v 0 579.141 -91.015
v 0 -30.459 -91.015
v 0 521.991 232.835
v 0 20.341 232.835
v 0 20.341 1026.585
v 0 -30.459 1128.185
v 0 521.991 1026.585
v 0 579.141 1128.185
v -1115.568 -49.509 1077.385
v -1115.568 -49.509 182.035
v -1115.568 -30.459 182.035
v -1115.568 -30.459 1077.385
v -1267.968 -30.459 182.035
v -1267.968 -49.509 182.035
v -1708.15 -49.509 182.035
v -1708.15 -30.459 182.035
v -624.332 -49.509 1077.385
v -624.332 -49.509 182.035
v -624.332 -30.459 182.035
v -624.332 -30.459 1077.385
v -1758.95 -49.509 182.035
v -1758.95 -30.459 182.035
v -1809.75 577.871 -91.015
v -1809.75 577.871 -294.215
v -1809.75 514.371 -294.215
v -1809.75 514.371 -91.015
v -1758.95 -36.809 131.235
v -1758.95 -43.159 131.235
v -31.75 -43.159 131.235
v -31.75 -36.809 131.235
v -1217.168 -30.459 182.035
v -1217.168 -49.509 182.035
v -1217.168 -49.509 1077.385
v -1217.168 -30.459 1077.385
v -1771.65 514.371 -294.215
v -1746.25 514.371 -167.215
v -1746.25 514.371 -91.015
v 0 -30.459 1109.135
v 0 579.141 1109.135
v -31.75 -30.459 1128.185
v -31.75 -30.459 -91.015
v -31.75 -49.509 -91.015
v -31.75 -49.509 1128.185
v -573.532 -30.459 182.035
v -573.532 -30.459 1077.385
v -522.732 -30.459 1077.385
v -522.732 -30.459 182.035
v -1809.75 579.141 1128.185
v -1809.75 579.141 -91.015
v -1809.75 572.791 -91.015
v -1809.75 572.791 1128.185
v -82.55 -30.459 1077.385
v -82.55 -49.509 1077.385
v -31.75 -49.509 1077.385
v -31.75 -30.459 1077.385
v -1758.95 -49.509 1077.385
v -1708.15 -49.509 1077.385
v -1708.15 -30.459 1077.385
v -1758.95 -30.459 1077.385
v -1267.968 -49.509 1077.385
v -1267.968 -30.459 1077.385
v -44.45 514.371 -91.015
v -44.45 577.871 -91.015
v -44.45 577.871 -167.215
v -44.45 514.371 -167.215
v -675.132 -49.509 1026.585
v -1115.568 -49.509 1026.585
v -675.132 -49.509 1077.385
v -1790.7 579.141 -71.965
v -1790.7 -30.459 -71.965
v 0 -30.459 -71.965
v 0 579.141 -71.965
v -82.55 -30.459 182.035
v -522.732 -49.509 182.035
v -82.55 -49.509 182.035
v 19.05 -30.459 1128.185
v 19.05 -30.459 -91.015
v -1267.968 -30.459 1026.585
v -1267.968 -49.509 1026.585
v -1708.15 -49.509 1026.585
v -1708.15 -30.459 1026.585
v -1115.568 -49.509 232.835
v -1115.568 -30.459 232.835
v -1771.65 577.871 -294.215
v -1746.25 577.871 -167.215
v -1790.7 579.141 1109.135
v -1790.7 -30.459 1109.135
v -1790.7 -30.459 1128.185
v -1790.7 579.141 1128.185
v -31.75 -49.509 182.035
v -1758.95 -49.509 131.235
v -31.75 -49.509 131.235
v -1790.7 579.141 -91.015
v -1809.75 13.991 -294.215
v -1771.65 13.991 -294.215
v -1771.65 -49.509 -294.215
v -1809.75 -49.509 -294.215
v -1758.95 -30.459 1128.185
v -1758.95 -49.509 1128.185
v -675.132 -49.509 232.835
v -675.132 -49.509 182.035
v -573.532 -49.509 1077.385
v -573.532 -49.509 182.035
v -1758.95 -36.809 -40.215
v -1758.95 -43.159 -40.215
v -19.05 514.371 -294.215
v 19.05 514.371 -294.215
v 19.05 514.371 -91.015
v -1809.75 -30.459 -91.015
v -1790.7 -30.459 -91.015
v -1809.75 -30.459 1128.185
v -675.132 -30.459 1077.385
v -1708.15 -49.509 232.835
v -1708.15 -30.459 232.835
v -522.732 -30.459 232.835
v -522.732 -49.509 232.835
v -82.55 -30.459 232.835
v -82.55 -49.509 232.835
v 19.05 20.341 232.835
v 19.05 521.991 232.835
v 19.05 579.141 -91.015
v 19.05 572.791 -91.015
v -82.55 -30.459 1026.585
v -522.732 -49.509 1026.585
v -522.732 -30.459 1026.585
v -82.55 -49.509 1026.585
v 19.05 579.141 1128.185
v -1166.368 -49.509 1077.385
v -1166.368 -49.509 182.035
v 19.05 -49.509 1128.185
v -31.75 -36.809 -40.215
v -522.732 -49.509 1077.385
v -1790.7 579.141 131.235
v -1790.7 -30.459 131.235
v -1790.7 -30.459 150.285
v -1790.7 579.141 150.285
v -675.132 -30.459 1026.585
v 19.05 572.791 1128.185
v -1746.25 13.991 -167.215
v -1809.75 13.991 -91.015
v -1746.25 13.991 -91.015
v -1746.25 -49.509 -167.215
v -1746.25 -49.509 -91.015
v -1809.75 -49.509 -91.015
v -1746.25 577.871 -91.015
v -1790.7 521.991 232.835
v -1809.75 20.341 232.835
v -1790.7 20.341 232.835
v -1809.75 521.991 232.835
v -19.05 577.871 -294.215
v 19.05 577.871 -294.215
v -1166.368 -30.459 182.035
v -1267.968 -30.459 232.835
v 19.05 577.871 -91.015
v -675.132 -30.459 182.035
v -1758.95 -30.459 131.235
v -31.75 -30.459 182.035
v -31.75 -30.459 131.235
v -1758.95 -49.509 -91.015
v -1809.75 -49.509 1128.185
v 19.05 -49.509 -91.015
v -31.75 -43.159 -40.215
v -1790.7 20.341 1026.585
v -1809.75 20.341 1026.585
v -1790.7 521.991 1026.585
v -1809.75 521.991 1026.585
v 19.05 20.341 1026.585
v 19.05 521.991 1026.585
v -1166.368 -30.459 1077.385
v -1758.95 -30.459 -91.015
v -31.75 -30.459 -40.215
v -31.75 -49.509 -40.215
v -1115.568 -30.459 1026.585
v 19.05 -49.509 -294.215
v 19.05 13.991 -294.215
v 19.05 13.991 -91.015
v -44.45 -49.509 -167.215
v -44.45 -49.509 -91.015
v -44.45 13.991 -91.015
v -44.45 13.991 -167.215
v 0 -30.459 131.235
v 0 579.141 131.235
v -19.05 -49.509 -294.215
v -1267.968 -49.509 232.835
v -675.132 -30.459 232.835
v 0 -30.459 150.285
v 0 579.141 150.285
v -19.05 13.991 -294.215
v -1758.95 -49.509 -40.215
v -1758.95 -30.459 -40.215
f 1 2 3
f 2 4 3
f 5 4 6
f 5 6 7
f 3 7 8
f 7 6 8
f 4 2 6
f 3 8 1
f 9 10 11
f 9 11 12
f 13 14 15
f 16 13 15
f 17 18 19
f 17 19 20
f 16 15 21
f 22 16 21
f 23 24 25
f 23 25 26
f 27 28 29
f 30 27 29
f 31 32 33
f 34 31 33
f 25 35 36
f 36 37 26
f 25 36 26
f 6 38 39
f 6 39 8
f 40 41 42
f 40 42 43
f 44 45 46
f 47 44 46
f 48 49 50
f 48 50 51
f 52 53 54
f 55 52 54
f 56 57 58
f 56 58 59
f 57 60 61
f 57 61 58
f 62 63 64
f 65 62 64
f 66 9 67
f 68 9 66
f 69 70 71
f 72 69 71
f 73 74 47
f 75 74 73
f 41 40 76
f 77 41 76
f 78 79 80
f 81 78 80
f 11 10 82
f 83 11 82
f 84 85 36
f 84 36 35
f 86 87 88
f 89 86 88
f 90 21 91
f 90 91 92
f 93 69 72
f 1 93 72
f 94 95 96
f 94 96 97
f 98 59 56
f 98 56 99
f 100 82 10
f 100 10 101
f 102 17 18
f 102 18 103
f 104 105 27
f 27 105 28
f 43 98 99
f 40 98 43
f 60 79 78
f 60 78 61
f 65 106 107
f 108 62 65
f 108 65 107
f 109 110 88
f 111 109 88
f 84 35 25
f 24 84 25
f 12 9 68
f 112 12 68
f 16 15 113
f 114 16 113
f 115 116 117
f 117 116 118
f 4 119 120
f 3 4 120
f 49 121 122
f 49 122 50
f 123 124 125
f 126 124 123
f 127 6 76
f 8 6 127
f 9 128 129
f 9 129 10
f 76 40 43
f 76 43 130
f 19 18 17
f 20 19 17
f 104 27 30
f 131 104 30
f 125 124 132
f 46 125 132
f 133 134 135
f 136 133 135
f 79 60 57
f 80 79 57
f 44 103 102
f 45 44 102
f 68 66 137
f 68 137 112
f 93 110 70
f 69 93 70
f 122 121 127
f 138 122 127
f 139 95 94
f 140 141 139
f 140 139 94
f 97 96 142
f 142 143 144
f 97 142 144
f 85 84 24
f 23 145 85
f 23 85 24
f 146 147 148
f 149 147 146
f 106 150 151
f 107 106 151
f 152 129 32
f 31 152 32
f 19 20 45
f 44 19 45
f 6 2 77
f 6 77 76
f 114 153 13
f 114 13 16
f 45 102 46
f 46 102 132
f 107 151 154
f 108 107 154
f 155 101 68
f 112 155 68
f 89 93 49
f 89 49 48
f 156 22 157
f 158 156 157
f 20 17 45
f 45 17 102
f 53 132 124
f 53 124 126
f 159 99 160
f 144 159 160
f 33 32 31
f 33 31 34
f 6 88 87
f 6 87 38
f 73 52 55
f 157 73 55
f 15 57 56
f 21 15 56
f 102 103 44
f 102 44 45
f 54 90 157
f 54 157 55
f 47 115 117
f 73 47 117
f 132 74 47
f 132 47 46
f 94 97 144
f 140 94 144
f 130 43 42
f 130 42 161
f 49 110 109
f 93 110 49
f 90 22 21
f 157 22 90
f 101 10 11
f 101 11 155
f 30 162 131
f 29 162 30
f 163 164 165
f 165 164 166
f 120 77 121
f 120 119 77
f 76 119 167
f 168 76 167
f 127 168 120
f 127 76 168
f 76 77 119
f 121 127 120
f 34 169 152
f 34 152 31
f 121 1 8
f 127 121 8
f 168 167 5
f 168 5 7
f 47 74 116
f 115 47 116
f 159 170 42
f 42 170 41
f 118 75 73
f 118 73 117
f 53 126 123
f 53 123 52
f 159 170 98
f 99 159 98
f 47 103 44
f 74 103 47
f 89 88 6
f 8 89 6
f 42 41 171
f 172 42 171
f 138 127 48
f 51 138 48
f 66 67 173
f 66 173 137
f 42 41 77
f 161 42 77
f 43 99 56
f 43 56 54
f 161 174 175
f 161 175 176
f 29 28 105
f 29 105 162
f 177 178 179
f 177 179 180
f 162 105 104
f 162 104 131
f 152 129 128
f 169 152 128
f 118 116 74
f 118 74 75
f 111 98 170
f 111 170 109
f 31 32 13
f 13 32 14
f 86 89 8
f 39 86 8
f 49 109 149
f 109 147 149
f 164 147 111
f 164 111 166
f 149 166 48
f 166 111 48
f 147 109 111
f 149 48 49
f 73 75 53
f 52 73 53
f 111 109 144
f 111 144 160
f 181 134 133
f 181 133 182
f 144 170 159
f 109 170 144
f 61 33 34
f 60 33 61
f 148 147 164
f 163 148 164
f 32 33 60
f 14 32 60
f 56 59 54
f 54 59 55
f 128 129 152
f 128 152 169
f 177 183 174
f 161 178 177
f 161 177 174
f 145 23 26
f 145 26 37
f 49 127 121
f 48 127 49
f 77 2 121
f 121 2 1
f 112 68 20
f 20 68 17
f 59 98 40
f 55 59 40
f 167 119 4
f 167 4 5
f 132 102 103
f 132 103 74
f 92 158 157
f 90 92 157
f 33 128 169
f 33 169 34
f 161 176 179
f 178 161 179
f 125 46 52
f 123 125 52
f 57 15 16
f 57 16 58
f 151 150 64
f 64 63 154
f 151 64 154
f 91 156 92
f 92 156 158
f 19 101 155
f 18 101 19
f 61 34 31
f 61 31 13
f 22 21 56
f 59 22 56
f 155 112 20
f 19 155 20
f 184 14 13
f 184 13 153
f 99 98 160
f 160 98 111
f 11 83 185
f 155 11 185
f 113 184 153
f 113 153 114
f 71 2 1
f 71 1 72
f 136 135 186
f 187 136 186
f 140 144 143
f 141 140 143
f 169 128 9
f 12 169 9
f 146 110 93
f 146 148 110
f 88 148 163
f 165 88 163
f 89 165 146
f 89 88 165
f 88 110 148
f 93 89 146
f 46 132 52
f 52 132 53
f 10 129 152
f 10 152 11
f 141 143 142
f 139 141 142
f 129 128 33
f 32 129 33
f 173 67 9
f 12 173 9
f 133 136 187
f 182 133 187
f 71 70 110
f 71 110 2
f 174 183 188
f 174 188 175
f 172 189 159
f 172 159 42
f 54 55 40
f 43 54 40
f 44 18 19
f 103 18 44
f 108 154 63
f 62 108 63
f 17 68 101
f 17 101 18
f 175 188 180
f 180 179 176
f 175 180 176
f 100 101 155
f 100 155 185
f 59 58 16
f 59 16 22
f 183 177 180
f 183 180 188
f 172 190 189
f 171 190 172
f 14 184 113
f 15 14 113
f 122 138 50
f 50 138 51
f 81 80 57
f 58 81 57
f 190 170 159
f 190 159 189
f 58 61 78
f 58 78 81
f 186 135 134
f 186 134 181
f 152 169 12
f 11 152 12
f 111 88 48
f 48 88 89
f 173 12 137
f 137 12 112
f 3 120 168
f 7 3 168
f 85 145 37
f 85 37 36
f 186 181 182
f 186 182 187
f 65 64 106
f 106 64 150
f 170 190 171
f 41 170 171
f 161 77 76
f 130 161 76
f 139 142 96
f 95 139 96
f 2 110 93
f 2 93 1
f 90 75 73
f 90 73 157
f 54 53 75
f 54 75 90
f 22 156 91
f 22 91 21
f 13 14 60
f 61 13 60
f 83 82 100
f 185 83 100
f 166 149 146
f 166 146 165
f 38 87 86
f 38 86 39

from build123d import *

# Parameters (mm, degrees)
F0_W      = 609.6
F0_H      = 1219.2
F1_DEPTH  = 19.05
F2_W      = 501.65
F2_H      = 793.75
F3_DEPTH  = 19.051
F6_W      = 1790.7
F6_H      = 19.05
F7_DEPTH  = 609.6
F8_W      = 1790.7
F8_H      = 19.05
F9_DEPTH  = 609.6
F10_W     = 1790.7
F10_H     = 19.05
F11_DEPTH = 609.6
F12_W     = 50.8
F12_H     = 1219.2
F13_DEPTH = 19.05
F15_W     = 1727.2
F15_H     = 50.8
F16_DEPTH = 19.05
F17_W     = 1727.2
F17_H     = 50.8
F18_DEPTH = 19.05
F19_W     = 1727.2
F19_H     = 50.8
F20_DEPTH = 19.05
F23_W     = 50.8
F23_H     = 895.35
F24_DEPTH = 19.05
F22_W     = 1727.2
F22_H     = 171.45
F26_DEPTH = 6.35
F27_W     = 50.8
F27_H     = 895.35
F28_DEPTH = 19.05
F29_W     = 50.8
F29_H     = 895.35
F30_DEPTH = 19.05
F31_W     = 440.182
F31_H     = 50.8
F32_DEPTH = 19.05
F33_W     = 440.182
F33_H     = 50.8
F34_DEPTH = 19.05
F36_W     = 50.8
F36_H     = 895.35
F37_DEPTH = 19.05
F38_W     = 50.8
F38_H     = 895.35
F39_DEPTH = 19.05
F40_W     = 440.436
F40_H     = 50.8
F41_DEPTH = 19.05
F42_W     = 440.436
F42_H     = 50.8
F43_DEPTH = 19.05
F44_W     = 1828.8
F44_H     = 1219.2
F45_DEPTH = 6.35
F47_DEPTH = 63.5


with BuildPart() as f1:
    # F0 (on Right) → F1 (new body)
    with BuildSketch(Plane.YZ):
        with Locations((274.3411302805, 518.5848358816)):
            Rectangle(F0_W, F0_H)
    extrude(amount=F1_DEPTH)

    # F2 (on face) → F3 (cut, through all)
    with BuildSketch(Plane.YZ.offset(19.05)):
        with Locations((271.1661302805, 629.7098358816)):
            Rectangle(F2_W, F2_H)
    extrude(amount=-F3_DEPTH, mode=Mode.SUBTRACT)


with BuildPart() as f5_1:
    # F5: instance of F1
    add(f1.part.mirror(Plane(origin=(-895.35, 278.0051626517, 390.3437028911), x_dir=(0, 1, 0), z_dir=(1, 0, 0))))


with BuildPart() as f7:
    # F6 (on face) → F7 (new body)
    with BuildSketch(Plane.XZ.offset(30.4588697195)):
        with Locations((-895.35, 1118.6598358816)):
            Rectangle(F6_W, F6_H)
    extrude(amount=-F7_DEPTH)


with BuildPart() as f9:
    # F8 (on face) → F9 (new body)
    with BuildSketch(Plane.XZ.offset(30.4588697195)):
        with Locations((-895.35, -81.4901641184)):
            Rectangle(F8_W, F8_H)
    extrude(amount=-F9_DEPTH)


with BuildPart() as f11:
    # F10 (on face) → F11 (new body)
    with BuildSketch(Plane.XZ.offset(30.4588697195)):
        with Locations((-895.35, 140.7598358816)):
            Rectangle(F10_W, F10_H)
    extrude(amount=-F11_DEPTH)


with BuildPart() as f13:
    # F12 (on face) → F13 (new body)
    with BuildSketch(Plane.XZ.offset(30.4588697195)):
        with Locations((-6.35, 518.5848358816)):
            Rectangle(F12_W, F12_H)
    extrude(amount=F13_DEPTH)


with BuildPart() as f14_1:
    # F14: instance of F13
    add(f13.part.mirror(Plane(origin=(-895.35, 278.0051626517, 390.3437028911), x_dir=(0, 1, 0), z_dir=(1, 0, 0))))


with BuildPart() as f16:
    # F15 (on face) → F16 (new body)
    with BuildSketch(Plane.XZ.offset(30.4588697195)):
        with Locations((-895.35, 1102.7848358816)):
            Rectangle(F15_W, F15_H)
    extrude(amount=F16_DEPTH)


with BuildPart() as f18:
    # F17 (on face) → F18 (new body)
    with BuildSketch(Plane.XZ.offset(30.4588697195)):
        with Locations((-895.35, 156.6348358816)):
            Rectangle(F17_W, F17_H)
    extrude(amount=F18_DEPTH)


with BuildPart() as f20:
    # F19 (on face) → F20 (new body)
    with BuildSketch(Plane.XZ.offset(30.4588697195)):
        with Locations((-895.35, -65.6151641184)):
            Rectangle(F19_W, F19_H)
    extrude(amount=F20_DEPTH)


with BuildPart() as f24:
    # F23 (on face) → F24 (new body)
    with BuildSketch(Plane.XZ.offset(49.5088697195)):
        with Locations((-598.932, 629.7098358816)):
            Rectangle(F23_W, F23_H)
    extrude(amount=-F24_DEPTH)


with BuildPart() as f25_1:
    # F25: instance of F24
    add(f24.part.mirror(Plane(origin=(-895.35, 278.0051626517, 390.3437028911), x_dir=(0, 1, 0), z_dir=(1, 0, 0))))


with BuildPart() as f26:
    # F22 (on offset) → F26 (new body)
    with BuildSketch(Plane.XZ.offset(43.1588697195)):
        with Locations((-895.35, 45.5098358816)):
            Rectangle(F22_W, F22_H)
    extrude(amount=-F26_DEPTH)


with BuildPart() as f28:
    # F27 (on face) → F28 (new body)
    with BuildSketch(Plane.XZ.offset(49.5088697195)):
        with Locations((-57.15, 629.7098358816)):
            Rectangle(F27_W, F27_H)
    extrude(amount=-F28_DEPTH)


with BuildPart() as f30:
    # F29 (on face) → F30 (new body)
    with BuildSketch(Plane.XZ.offset(49.5088697195)):
        with Locations((-548.132, 629.7098358816)):
            Rectangle(F29_W, F29_H)
    extrude(amount=-F30_DEPTH)


with BuildPart() as f32:
    # F31 (on face) → F32 (new body)
    with BuildSketch(Plane.XZ.offset(49.5088697195)):
        with Locations((-302.641, 1051.9848358816)):
            Rectangle(F31_W, F31_H)
    extrude(amount=-F32_DEPTH)


with BuildPart() as f34:
    # F33 (on face) → F34 (new body)
    with BuildSketch(Plane.XZ.offset(49.5088697195)):
        with Locations((-302.641, 207.4348358816)):
            Rectangle(F33_W, F33_H)
    extrude(amount=-F34_DEPTH)


with BuildPart() as f35_1:
    # F35: instance of F30
    add(f30.part.mirror(Plane(origin=(-895.35, 278.0051626517, 390.3437028911), x_dir=(0, 1, 0), z_dir=(1, 0, 0))))


with BuildPart() as f35_2:
    # F35: instance of F32
    add(f32.part.mirror(Plane(origin=(-895.35, 278.0051626517, 390.3437028911), x_dir=(0, 1, 0), z_dir=(1, 0, 0))))


with BuildPart() as f35_3:
    # F35: instance of F28
    add(f28.part.mirror(Plane(origin=(-895.35, 278.0051626517, 390.3437028911), x_dir=(0, 1, 0), z_dir=(1, 0, 0))))


with BuildPart() as f35_4:
    # F35: instance of F34
    add(f34.part.mirror(Plane(origin=(-895.35, 278.0051626517, 390.3437028911), x_dir=(0, 1, 0), z_dir=(1, 0, 0))))


with BuildPart() as f37:
    # F36 (on face) → F37 (new body)
    with BuildSketch(Plane.XZ.offset(49.5088697195)):
        with Locations((-649.732, 629.7098358816)):
            Rectangle(F36_W, F36_H)
    extrude(amount=-F37_DEPTH)


with BuildPart() as f39:
    # F38 (on face) → F39 (new body)
    with BuildSketch(Plane.XZ.offset(49.5088697195)):
        with Locations((-1140.968, 629.7098358816)):
            Rectangle(F38_W, F38_H)
    extrude(amount=-F39_DEPTH)


with BuildPart() as f41:
    # F40 (on face) → F41 (new body)
    with BuildSketch(Plane.XZ.offset(49.5088697195)):
        with Locations((-895.35, 1051.9848358816)):
            Rectangle(F40_W, F40_H)
    extrude(amount=-F41_DEPTH)


with BuildPart() as f43:
    # F42 (on face) → F43 (new body)
    with BuildSketch(Plane.XZ.offset(49.5088697195)):
        with Locations((-895.35, 207.4348358816)):
            Rectangle(F42_W, F42_H)
    extrude(amount=-F43_DEPTH)


with BuildPart() as f45:
    # F44 (on face) → F45 (new body)
    with BuildSketch(Plane(origin=(0, 579.1411302805, 0), x_dir=(-1, 0, 0), z_dir=(0, 1, 0))):
        with Locations((895.35, 518.5848358816)):
            Rectangle(F44_W, F44_H)
    extrude(amount=-F45_DEPTH)


with BuildPart() as f47:
    # F46 (on face) → F47 (new body)
    with BuildSketch(Plane.XZ.offset(49.5088697195)):
        Polygon((19.05, -294.2151641184), (19.05, -91.0151641184), (-44.45, -91.0151641184), (-44.45, -167.2151641184), (-19.05, -294.2151641184), align=None)
    extrude(amount=-F47_DEPTH)


with BuildPart() as f48_1:
    # F48: instance of F47
    add(f47.part.mirror(Plane(origin=(-895.35, 278.0051626517, 390.3437028911), x_dir=(0, 1, 0), z_dir=(1, 0, 0))))


with BuildPart() as f50_1:
    # F50: instance of F48_1
    add(f48_1.part.mirror(Plane(origin=(-895.35, 264.1811302805, 1118.6598358816), x_dir=(1, 0, 0), z_dir=(0, 1, 0))))


with BuildPart() as f50_2:
    # F50: instance of F47
    add(f47.part.mirror(Plane(origin=(-895.35, 264.1811302805, 1118.6598358816), x_dir=(1, 0, 0), z_dir=(0, 1, 0))))


solid = Compound([f1.part, f5_1.part, f7.part, f9.part, f11.part, f13.part, f14_1.part, f16.part, f18.part, f20.part, f24.part, f25_1.part, f26.part, f28.part, f30.part, f32.part, f34.part, f35_1.part, f35_2.part, f35_3.part, f35_4.part, f37.part, f39.part, f41.part, f43.part, f45.part, f47.part, f48_1.part, f50_1.part, f50_2.part])
